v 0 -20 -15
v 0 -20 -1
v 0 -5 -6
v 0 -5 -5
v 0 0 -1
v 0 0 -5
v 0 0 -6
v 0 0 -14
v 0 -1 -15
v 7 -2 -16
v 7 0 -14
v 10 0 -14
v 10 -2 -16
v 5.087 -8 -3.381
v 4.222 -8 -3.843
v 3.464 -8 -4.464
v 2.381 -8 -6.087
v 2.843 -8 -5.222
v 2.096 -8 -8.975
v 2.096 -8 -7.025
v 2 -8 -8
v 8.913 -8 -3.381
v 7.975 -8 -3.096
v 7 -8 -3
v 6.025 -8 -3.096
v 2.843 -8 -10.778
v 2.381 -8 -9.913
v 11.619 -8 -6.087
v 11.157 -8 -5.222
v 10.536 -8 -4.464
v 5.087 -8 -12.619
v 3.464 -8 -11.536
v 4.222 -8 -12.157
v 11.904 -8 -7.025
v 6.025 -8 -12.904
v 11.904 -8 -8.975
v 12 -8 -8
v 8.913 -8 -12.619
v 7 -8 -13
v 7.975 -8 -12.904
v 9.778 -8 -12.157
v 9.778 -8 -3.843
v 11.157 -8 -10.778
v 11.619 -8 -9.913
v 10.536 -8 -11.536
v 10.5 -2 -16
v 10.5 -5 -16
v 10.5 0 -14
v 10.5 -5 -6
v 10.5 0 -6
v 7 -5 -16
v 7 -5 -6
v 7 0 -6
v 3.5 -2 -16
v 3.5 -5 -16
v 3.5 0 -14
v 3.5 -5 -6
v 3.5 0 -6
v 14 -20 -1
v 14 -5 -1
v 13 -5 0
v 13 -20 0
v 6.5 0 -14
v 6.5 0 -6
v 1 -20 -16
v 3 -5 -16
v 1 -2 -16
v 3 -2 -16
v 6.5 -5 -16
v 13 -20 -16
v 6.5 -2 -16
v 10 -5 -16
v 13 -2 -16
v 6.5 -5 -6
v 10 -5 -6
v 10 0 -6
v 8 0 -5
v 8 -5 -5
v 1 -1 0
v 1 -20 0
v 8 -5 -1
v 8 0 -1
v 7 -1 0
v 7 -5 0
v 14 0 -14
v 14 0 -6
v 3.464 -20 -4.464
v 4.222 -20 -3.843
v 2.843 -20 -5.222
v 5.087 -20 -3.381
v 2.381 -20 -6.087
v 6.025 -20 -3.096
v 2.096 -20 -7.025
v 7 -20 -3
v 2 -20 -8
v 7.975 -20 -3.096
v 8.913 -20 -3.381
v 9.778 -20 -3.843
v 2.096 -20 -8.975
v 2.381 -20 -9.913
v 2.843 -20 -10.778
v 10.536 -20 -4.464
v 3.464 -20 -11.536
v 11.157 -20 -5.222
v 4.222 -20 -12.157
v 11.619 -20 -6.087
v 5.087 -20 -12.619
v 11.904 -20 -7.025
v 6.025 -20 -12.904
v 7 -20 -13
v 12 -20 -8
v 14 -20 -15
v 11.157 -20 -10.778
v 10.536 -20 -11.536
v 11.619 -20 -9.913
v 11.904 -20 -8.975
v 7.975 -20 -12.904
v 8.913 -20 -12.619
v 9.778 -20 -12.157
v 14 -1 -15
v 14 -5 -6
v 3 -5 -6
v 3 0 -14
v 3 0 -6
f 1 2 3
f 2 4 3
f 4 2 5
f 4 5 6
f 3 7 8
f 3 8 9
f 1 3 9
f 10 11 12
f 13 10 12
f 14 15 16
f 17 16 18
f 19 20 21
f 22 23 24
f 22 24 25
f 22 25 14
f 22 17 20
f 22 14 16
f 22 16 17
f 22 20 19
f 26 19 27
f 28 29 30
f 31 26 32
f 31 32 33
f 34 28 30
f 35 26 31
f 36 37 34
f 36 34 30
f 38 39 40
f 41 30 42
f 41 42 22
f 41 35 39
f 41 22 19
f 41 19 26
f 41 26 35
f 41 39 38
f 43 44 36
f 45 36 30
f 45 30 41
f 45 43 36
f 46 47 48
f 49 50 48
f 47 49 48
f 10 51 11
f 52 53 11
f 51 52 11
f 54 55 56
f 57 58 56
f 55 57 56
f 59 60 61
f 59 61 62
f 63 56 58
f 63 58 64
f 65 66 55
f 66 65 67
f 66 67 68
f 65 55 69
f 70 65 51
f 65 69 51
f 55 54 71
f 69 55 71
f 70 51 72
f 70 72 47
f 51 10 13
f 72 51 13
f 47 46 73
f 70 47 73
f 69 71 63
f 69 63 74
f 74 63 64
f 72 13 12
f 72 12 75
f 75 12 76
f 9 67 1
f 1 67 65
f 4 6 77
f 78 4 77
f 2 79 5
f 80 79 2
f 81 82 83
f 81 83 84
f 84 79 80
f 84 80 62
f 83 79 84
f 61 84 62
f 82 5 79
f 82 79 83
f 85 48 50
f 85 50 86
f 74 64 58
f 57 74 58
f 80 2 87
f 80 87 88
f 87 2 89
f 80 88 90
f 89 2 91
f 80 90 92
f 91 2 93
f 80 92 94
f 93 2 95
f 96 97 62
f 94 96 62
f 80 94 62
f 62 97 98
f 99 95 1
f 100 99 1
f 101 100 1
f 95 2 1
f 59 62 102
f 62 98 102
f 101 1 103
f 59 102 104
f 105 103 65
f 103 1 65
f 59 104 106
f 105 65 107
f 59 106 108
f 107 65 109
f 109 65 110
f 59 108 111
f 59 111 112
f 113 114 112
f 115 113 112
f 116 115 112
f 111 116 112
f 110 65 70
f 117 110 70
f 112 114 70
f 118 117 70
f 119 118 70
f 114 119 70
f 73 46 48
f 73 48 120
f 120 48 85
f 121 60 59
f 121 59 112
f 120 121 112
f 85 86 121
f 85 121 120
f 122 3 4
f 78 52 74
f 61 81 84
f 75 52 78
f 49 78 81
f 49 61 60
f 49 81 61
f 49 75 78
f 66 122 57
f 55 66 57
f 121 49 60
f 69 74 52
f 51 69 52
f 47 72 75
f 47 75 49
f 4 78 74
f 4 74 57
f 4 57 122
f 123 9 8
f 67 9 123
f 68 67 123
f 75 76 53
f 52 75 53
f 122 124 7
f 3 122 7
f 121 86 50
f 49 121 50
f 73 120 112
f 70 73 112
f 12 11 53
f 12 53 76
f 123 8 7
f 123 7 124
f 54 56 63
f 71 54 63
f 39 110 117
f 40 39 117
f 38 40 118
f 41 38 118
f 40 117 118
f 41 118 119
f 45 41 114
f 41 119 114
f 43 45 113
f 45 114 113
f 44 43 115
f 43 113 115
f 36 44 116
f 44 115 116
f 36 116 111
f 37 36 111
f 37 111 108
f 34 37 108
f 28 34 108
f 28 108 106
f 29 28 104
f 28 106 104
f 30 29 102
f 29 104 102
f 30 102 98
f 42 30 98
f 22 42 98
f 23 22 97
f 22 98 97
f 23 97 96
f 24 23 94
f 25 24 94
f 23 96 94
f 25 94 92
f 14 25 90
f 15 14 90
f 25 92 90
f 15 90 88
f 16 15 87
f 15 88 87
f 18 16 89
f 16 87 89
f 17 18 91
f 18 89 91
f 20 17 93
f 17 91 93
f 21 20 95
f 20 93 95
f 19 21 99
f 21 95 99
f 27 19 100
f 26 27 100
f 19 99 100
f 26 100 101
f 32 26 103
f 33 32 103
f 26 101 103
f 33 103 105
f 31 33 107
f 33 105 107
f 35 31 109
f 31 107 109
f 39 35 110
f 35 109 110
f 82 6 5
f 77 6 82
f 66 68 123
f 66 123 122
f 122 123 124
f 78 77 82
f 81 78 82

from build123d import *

# Parameters (mm, degrees)
SKETCH1_W           = 14
SKETCH1_H           = 16
BOSS_EXTRUDE1_DEPTH = 20
CUT_EXTRUDE1_DEPTH  = 5
CHAMFER1_SIZE       = 2
CHAMFER2_SIZE       = 1
SKETCH4_R           = 5
CUT_EXTRUDE2_DEPTH  = 12


with BuildPart() as part:
    # Sketch1 → Boss-Extrude1 (new body)
    with BuildSketch(Plane(origin=(0, 0, 0), x_dir=(1, 0, 0), z_dir=(0, 1, 0))):
        with Locations((7, 8)):
            Rectangle(SKETCH1_W, SKETCH1_H)
    extrude(amount=-BOSS_EXTRUDE1_DEPTH)

    # Sketch2 → Cut-Extrude1 (cut)
    with BuildSketch(Plane(origin=(0, 0, 0), x_dir=(1, 0, 0), z_dir=(0, 1, 0))):
        Polygon((3, 6), (0, 6), (0, 5), (8, 5), (8, 0), (14, 0), (14, 6), (10.5, 6), (10.5, 16), (10, 16), (10, 6), (7, 6), (7, 16), (6.5, 16), (6.5, 6), (3.5, 6), (3.5, 16), (3, 16), align=None)
    extrude(amount=-CUT_EXTRUDE1_DEPTH, mode=Mode.SUBTRACT)

    # Chamfer1
    chamfer1_edges = [part.edges().sort_by_distance(p)[0] for p in [
        (8.5, 0, -16),
        (5, 0, -16),
        (1.5, 0, -16),
        (12.25, 0, -16),
    ]]
    chamfer(chamfer1_edges, length=CHAMFER1_SIZE)

    # Chamfer2
    chamfer2_edges = [part.edges().sort_by_distance(p)[0] for p in [
        (8, -2.5, 0),
        (4, 0, 0),
        (0, -11, -16),
        (14, -11, -16),
        (14, -12.5, 0),
        (0, -10, 0),
    ]]
    chamfer(chamfer2_edges, length=CHAMFER2_SIZE)

    # Sketch4 → Cut-Extrude2 (cut)
    with BuildSketch(Plane.XZ.offset(20)):
        with Locations(Location((7, -8, 0), (0, 0, 270))):
            Circle(SKETCH4_R)
    extrude(amount=-CUT_EXTRUDE2_DEPTH, mode=Mode.SUBTRACT)


solid = part.part
